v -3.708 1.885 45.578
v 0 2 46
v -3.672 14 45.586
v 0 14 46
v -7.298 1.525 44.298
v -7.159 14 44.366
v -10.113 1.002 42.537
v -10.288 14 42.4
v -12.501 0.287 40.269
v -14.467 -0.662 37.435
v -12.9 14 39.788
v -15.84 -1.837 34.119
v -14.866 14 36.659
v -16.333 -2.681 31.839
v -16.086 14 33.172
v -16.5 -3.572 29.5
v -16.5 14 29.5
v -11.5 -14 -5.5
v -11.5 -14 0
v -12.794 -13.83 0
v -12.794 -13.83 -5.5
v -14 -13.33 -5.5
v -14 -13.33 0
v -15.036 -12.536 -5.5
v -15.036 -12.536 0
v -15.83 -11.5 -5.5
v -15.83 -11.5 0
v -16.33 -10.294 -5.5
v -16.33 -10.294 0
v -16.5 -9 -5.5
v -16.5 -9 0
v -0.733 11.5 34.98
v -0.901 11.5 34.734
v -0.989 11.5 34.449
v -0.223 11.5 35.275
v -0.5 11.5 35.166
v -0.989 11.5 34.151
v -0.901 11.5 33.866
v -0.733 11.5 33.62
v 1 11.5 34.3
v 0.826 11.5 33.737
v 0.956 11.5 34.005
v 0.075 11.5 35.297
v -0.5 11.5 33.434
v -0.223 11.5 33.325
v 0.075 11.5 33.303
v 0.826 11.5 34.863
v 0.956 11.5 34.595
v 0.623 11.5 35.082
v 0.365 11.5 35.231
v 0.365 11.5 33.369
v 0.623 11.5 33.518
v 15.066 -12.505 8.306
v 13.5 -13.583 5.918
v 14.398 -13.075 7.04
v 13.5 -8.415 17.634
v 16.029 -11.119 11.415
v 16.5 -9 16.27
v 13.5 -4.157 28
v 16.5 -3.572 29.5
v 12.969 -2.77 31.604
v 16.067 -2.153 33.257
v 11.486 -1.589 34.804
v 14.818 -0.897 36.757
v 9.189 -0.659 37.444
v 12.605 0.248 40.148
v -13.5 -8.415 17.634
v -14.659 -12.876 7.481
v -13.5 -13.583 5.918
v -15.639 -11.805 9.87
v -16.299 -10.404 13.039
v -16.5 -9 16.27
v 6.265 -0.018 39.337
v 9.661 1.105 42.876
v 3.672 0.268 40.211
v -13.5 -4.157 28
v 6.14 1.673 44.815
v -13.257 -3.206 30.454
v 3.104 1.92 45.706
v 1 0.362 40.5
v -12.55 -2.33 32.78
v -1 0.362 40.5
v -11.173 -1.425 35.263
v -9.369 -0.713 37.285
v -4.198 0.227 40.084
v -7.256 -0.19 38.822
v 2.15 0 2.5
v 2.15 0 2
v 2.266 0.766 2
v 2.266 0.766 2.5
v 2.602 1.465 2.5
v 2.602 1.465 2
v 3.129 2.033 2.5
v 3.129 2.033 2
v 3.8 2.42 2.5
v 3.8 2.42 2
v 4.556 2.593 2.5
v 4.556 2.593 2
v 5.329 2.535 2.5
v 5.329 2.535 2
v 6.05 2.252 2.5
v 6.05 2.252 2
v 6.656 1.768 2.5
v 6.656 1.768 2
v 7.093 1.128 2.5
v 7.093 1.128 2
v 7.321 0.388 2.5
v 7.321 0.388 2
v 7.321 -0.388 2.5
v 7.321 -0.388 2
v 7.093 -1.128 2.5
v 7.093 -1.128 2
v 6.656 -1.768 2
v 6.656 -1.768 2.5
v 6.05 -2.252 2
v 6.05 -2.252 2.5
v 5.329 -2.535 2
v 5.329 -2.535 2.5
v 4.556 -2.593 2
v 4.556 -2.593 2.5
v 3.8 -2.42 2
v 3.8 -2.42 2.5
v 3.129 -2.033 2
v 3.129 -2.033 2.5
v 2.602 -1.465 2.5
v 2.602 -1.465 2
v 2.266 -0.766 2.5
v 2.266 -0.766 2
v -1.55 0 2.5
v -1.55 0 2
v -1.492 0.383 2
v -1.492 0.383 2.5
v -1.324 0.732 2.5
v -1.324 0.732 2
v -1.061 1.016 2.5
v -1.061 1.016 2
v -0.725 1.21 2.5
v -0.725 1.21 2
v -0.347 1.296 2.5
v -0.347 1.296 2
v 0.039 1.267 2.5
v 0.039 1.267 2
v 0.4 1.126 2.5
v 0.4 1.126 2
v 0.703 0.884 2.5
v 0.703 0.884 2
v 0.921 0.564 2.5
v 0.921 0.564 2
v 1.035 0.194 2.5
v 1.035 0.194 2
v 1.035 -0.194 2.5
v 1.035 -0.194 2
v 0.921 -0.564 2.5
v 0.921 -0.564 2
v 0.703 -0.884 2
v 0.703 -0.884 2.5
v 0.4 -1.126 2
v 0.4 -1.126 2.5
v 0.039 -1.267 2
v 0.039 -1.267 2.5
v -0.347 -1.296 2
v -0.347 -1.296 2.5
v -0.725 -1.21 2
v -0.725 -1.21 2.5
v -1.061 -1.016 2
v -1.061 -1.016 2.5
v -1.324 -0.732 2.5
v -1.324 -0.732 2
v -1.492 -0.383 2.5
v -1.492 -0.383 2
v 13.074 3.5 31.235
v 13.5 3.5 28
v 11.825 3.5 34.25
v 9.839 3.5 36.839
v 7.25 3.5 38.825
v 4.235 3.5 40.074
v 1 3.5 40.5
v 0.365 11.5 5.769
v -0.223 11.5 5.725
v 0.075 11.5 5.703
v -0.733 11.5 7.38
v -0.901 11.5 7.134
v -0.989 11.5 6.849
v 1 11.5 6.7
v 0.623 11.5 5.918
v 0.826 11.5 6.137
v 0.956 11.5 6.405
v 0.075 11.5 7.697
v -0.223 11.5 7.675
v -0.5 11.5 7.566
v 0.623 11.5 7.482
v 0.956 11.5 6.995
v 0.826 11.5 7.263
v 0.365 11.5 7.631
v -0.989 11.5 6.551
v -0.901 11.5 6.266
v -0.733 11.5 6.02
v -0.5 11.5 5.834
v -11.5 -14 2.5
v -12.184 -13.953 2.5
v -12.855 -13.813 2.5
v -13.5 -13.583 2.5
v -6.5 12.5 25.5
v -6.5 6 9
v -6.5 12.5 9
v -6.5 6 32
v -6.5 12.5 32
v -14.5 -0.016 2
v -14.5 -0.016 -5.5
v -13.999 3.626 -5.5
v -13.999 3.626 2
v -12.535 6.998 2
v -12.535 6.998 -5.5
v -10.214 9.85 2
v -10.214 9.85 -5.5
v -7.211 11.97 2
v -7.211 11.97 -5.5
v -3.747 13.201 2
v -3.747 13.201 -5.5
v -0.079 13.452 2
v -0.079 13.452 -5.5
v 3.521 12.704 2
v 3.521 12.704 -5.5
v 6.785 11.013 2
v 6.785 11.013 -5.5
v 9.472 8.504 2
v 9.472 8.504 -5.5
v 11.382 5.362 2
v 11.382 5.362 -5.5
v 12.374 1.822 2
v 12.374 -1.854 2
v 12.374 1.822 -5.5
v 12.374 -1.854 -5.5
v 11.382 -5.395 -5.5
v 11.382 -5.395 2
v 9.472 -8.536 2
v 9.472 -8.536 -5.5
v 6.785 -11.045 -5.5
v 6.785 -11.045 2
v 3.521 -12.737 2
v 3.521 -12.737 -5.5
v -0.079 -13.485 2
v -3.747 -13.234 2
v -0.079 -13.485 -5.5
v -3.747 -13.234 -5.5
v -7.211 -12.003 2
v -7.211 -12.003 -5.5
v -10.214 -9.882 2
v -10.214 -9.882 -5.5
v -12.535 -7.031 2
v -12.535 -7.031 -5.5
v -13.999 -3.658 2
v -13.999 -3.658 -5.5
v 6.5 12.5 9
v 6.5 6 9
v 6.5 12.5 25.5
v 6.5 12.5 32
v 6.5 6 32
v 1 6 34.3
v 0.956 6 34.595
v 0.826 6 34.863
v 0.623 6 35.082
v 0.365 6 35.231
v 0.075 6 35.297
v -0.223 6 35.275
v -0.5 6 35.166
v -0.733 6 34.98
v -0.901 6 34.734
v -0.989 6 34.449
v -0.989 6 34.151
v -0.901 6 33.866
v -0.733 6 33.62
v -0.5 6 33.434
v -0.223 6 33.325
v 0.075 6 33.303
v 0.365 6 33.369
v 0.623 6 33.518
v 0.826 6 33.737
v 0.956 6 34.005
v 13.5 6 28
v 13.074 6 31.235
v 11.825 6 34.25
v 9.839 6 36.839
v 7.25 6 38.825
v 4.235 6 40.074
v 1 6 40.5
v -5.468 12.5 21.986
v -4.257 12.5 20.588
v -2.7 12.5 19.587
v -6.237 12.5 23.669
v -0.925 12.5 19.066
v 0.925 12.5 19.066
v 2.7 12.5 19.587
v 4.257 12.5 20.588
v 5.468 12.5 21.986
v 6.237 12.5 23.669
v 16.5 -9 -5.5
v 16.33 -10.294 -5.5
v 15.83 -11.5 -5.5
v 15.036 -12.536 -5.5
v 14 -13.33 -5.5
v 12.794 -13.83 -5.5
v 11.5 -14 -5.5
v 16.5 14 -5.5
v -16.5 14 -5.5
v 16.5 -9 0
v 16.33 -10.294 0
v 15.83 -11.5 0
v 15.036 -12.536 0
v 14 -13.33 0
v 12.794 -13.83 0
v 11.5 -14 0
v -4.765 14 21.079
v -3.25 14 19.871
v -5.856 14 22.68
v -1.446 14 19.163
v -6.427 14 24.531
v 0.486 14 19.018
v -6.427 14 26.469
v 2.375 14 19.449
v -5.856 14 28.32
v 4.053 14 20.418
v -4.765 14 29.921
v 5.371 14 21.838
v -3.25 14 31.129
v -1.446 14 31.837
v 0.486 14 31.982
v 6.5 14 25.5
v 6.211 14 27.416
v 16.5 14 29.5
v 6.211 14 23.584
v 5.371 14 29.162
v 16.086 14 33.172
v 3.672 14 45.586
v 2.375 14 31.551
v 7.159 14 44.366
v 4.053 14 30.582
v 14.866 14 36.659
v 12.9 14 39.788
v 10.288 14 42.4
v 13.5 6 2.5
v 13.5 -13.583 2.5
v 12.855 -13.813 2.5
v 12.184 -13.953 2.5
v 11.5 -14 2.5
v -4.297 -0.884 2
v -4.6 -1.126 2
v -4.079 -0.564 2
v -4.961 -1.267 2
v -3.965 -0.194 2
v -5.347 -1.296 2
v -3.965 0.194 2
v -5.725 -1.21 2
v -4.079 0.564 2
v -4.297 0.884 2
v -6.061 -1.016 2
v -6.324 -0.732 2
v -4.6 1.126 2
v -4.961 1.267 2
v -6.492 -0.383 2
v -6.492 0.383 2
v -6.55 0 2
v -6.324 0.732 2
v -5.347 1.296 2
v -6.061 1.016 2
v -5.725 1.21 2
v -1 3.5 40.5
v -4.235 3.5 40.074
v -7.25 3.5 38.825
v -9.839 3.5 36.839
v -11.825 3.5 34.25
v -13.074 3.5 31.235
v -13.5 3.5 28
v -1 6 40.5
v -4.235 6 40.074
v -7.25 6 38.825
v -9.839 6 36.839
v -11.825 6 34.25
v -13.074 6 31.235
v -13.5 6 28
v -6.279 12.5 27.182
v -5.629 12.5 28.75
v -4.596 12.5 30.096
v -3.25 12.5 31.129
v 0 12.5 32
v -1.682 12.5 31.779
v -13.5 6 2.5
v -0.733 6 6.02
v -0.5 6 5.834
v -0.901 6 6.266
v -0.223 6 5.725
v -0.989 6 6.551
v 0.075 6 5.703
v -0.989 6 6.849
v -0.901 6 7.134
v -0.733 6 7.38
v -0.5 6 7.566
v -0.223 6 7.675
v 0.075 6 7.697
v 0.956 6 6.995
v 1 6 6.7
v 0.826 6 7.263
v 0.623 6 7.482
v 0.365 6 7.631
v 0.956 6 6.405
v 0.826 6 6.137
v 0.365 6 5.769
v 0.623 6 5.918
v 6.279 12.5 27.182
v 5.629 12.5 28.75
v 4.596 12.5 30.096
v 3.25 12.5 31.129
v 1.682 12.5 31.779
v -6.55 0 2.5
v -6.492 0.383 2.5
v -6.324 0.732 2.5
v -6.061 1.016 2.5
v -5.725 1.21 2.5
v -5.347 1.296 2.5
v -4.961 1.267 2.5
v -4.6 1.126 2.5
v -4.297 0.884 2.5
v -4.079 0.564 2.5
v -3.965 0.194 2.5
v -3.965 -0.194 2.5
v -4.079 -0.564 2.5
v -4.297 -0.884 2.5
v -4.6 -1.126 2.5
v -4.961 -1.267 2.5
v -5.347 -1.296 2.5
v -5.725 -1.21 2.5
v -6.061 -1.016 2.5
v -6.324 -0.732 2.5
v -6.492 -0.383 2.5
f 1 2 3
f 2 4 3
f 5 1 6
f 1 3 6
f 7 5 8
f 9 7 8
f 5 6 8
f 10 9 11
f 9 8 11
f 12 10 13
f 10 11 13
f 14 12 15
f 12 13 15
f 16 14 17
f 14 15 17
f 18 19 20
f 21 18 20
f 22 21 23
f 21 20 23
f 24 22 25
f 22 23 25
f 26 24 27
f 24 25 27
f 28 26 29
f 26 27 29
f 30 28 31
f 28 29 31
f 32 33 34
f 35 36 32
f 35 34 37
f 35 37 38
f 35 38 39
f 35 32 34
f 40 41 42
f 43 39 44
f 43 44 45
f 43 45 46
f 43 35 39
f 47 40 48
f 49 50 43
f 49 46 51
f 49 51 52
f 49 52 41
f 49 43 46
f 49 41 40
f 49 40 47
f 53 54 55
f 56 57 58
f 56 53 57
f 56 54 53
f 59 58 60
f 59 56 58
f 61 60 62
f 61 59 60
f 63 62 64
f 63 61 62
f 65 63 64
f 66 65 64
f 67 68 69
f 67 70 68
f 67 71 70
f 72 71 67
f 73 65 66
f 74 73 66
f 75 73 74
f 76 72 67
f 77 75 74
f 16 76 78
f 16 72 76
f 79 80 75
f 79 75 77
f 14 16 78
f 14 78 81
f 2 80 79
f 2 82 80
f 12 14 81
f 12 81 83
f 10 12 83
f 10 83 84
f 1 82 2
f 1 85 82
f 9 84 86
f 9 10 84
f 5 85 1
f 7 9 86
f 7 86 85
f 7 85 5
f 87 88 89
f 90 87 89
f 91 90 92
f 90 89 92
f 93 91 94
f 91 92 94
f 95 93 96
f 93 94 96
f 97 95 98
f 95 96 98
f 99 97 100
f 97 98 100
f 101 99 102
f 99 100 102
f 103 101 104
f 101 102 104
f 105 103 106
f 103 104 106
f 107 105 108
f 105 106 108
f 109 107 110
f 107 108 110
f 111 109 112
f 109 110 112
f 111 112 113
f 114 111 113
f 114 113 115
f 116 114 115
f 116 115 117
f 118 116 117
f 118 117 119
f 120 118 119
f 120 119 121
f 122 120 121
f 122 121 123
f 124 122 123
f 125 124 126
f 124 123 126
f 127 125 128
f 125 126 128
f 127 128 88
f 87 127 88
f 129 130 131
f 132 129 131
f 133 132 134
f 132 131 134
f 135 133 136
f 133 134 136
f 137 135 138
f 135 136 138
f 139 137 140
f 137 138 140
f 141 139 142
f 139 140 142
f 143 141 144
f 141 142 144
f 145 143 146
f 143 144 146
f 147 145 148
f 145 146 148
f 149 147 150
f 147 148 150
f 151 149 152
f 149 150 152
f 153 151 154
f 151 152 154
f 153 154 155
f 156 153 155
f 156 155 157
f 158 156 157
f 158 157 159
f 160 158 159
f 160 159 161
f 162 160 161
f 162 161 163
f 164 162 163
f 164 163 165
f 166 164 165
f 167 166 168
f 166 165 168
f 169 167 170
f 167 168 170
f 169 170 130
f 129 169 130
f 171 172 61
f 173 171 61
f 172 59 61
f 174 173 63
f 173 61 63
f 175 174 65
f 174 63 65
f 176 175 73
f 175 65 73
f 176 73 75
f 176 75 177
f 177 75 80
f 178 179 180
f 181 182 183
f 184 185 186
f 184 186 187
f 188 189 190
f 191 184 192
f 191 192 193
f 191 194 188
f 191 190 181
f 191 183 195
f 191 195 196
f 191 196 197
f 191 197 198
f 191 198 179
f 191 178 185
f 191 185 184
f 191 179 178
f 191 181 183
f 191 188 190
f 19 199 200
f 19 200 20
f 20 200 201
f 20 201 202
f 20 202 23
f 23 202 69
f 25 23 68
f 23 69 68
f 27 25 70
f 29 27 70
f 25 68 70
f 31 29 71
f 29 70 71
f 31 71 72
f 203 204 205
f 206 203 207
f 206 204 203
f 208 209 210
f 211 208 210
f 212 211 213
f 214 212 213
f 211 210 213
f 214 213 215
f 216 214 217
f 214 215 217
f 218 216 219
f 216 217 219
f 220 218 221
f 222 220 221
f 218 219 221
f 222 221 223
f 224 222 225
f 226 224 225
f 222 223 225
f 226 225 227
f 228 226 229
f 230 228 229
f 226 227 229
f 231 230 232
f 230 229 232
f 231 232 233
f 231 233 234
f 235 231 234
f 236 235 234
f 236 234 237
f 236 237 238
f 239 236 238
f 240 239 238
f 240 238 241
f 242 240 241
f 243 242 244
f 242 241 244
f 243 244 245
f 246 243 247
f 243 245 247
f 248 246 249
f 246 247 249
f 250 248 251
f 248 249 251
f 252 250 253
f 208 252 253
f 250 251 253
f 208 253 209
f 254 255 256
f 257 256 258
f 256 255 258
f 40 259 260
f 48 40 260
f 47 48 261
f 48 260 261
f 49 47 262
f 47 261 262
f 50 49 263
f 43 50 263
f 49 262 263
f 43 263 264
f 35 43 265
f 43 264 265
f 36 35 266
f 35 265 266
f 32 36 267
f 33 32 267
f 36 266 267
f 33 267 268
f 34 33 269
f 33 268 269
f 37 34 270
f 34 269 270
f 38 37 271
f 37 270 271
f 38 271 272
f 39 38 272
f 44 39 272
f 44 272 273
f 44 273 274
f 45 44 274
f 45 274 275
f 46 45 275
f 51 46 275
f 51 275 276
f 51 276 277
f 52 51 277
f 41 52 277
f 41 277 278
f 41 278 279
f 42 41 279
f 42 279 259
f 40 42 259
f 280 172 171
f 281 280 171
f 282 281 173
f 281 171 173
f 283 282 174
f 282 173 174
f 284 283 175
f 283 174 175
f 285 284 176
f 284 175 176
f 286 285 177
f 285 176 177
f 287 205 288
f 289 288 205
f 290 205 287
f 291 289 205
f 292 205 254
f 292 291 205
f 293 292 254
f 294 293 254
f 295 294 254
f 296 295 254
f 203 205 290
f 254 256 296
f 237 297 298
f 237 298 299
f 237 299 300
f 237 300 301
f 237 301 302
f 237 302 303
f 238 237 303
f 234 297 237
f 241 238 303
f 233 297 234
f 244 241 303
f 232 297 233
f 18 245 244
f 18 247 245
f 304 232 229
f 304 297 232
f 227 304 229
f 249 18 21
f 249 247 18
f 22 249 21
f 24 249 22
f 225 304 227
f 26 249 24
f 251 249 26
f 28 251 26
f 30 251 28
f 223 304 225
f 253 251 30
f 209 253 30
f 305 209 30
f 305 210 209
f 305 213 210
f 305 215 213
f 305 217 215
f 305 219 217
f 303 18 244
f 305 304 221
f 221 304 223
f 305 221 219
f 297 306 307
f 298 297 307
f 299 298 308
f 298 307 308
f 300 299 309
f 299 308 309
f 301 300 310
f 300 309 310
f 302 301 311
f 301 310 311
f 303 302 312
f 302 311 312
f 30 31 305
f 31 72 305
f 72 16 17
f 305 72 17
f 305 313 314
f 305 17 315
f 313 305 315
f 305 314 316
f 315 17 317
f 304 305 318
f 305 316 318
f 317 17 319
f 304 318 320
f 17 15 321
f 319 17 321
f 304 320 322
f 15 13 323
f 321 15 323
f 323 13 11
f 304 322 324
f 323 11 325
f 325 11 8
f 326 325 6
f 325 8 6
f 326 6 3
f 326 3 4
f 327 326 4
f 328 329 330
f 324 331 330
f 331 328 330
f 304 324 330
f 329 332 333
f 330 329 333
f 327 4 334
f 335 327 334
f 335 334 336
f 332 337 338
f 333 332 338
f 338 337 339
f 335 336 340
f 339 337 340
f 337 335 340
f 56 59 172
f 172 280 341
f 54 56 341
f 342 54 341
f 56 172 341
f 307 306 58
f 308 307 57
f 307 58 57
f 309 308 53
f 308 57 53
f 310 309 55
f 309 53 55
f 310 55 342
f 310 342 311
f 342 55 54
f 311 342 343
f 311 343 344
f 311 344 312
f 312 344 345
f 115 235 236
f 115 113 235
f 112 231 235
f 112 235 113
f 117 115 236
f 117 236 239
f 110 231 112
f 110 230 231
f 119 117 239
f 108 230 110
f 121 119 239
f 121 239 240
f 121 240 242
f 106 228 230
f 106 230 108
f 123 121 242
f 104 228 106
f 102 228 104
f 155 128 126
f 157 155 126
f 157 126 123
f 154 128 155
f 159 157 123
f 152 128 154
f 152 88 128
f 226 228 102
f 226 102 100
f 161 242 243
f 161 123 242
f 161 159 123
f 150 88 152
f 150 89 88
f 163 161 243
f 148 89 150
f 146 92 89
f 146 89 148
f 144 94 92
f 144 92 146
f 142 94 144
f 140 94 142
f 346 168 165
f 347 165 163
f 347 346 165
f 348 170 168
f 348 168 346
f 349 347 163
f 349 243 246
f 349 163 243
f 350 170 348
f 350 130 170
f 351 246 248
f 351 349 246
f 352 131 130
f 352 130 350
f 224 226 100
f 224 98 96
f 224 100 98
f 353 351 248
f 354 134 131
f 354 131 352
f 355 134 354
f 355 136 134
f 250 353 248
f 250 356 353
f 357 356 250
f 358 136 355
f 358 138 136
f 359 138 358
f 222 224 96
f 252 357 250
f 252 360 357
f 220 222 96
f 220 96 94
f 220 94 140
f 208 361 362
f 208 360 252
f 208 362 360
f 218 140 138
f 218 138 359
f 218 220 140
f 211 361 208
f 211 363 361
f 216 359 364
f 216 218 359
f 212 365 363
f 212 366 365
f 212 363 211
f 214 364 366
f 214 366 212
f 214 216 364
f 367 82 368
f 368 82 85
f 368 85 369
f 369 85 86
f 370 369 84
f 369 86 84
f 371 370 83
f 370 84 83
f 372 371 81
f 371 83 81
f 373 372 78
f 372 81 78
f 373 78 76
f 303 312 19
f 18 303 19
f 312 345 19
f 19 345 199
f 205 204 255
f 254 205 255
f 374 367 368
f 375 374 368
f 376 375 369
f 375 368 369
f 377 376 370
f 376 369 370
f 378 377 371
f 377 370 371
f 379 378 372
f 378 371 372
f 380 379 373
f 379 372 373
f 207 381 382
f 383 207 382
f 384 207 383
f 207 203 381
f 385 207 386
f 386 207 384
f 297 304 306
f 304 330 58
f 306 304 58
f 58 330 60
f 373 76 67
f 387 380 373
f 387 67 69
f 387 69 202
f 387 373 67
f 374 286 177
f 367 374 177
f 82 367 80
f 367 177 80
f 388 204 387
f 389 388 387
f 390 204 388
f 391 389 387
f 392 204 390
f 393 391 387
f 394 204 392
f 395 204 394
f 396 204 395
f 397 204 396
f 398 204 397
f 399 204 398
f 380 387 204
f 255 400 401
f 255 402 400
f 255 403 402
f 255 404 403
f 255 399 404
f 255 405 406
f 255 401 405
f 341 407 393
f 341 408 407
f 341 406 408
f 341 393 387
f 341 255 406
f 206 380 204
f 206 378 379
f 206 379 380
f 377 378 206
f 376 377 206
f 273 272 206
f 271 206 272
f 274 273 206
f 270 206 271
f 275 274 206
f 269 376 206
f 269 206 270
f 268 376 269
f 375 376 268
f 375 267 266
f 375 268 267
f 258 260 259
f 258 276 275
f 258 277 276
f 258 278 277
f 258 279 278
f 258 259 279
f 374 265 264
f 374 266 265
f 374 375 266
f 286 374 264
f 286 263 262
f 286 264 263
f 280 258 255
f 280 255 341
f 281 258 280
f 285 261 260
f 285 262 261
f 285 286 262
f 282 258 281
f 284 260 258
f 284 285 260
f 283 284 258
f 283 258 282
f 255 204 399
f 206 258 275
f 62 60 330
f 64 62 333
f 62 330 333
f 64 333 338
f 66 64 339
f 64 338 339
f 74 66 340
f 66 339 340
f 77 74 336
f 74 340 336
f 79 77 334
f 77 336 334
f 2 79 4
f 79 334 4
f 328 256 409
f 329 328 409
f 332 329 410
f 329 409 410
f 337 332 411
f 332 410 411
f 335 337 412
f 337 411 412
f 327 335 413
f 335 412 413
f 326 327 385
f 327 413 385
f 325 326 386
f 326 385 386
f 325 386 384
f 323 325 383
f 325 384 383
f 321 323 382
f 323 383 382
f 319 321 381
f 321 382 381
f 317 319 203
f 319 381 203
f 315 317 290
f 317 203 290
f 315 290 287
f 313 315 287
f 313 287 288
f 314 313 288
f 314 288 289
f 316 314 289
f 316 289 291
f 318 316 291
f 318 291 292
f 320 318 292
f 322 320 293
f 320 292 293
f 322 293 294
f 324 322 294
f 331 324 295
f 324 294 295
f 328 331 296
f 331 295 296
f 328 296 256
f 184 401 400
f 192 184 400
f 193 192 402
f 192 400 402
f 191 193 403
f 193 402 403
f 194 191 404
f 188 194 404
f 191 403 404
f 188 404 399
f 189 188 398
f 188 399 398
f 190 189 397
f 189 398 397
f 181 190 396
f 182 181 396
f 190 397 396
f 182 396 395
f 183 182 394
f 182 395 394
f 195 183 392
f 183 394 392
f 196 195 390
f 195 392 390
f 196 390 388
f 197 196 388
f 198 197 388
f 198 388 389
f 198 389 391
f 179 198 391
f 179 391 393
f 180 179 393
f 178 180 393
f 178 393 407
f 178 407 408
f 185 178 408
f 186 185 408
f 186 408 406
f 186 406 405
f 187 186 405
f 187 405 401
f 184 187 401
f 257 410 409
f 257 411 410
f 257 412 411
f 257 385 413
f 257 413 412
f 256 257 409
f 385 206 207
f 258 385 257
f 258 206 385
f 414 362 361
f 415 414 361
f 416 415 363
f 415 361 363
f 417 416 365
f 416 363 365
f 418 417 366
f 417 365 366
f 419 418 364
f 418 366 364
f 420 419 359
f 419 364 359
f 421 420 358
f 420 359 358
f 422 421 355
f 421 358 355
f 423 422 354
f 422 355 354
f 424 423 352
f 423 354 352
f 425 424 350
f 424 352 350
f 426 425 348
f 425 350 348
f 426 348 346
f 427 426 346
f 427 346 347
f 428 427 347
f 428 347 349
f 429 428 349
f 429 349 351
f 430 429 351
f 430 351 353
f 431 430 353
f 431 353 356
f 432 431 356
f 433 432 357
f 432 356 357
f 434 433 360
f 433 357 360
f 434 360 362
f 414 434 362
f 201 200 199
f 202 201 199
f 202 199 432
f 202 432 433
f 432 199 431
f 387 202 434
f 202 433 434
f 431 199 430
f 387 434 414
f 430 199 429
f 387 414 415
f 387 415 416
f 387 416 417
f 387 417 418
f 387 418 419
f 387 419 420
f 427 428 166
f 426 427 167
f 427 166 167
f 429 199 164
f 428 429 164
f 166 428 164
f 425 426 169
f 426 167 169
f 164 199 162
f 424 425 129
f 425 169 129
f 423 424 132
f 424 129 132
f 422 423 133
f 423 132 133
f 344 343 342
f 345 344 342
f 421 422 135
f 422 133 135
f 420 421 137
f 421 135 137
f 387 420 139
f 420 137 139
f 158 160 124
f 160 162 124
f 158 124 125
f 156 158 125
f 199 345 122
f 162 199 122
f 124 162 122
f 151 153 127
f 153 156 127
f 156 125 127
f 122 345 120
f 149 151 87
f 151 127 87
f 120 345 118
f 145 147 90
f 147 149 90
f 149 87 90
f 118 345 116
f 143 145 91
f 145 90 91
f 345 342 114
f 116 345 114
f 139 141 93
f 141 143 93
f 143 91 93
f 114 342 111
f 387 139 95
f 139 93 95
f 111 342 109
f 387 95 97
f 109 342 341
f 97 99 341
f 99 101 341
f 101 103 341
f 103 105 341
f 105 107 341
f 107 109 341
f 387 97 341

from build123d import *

# Parameters (mm, degrees)
SKETCH1_W               = 33
SKETCH1_H               = 28
BOSS_EXTRUDE1_DEPTH     = 46
CUT_EXTRUDE1_DEPTH      = 59.318093247
CUT_EXTRUDE1_DEPTH_BACK = 59.318093247
CUT_EXTRUDE2_START      = -3
CUT_EXTRUDE2_DEPTH      = 27
FILLET1_R               = 12.5
FILLET2_R               = 16.5
FILLET3_R               = 5
SKETCH4_W               = 13
SKETCH4_H               = 23
CUT_EXTRUDE3_DEPTH      = 9
SKETCH5_R               = 6.5
CUT_EXTRUDE4_DEPTH      = 56.592265809
SKETCH6_R               = 1
CUT_EXTRUDE5_DEPTH      = 8
BOSS_EXTRUDE2_DEPTH     = 5.5
SKETCH11_R              = 13.5
CUT_EXTRUDE8_DEPTH      = 7.5
SKETCH7_R               = 1.3
SKETCH7_R_2             = 2.6
CUT_EXTRUDE6_DEPTH      = 0.5
SKETCH12_R              = 1
CUT_EXTRUDE9_DEPTH      = 2.5


with BuildPart() as part:
    # Sketch1 → Boss-Extrude1 (new body)
    with BuildSketch(Plane.XY):
        Rectangle(SKETCH1_W, SKETCH1_H)
    extrude(amount=BOSS_EXTRUDE1_DEPTH)

    # Sketch2 → Cut-Extrude1 (cut, two sides: drawn at the far end of the back side and taken through both)
    with BuildSketch(Plane(origin=(16.5, 0, 0), x_dir=(0, 0, -1), z_dir=(1, 0, 0)).offset(-CUT_EXTRUDE1_DEPTH_BACK)):
        with BuildLine():
            Line((-46, -14), (-5, -14))
            add(Edge.make_bspline(
                [(-5, -14), (-31.642917286, -1.866068932), (-46, 2)],
                knots=[0, 0, 0, 1, 1, 1], degree=2))
            Line((-46, 2), (-46, -14))
        make_face()
    extrude(amount=CUT_EXTRUDE1_DEPTH + CUT_EXTRUDE1_DEPTH_BACK, mode=Mode.SUBTRACT)

    # Sketch3 → Cut-Extrude2 (cut)
    with BuildSketch(Plane(origin=(16.5, 0, 0), x_dir=(0, 0, -1), z_dir=(1, 0, 0)).offset(CUT_EXTRUDE2_START)):
        with BuildLine():
            Line((-5, -14), (-2.5, -14))
            Line((-2.5, -14), (-2.5, 3.5))
            Line((-2.5, 3.5), (-40.5, 3.5))
            Line((-40.5, 3.5), (-40.5, 0.361845))
            add(Edge.make_bspline(
                [(-5, -14), (-26.900788686, -4.025767171), (-40.5, 0.361845)],
                knots=[0, 0, 0, 1, 1, 1], degree=2))
        make_face()
    extrude(amount=-CUT_EXTRUDE2_DEPTH, mode=Mode.SUBTRACT)

    # Fillet1
    fillet1_edges = [part.edges().sort_by_distance(p)[0] for p in [
        (13.5, 1.9309225, 40.5),
        (-13.5, 1.9309225, 40.5),
    ]]
    fillet(fillet1_edges, radius=FILLET1_R)

    # Fillet2
    fillet2_edges = [part.edges().sort_by_distance(p)[0] for p in [
        (16.5, 8, 46),
        (-16.5, 8, 46),
    ]]
    fillet(fillet2_edges, radius=FILLET2_R - 0.0001)  # a hair under: the kernel refuses the full size

    # Fillet3
    fillet3_edges = [part.edges().sort_by_distance(p)[0] for p in [
        (16.5, -14, 2.5),
        (-16.5, -14, 2.5),
    ]]
    fillet(fillet3_edges, radius=FILLET3_R)

    # Sketch4 → Cut-Extrude3 (cut)
    with BuildSketch(Plane.XZ.offset(-3.5)):
        with Locations((0, 20.5)):
            Rectangle(SKETCH4_W, SKETCH4_H)
    extrude(amount=-CUT_EXTRUDE3_DEPTH, mode=Mode.SUBTRACT)

    # Sketch5 → Cut-Extrude4 (cut, through all)
    with BuildSketch(Plane.XZ.offset(-12.5)):
        with Locations((0, 25.5)):
            Circle(SKETCH5_R)
    extrude(amount=-CUT_EXTRUDE4_DEPTH, mode=Mode.SUBTRACT)

    # Sketch6 → Cut-Extrude5 (cut)
    with BuildSketch(Plane.XZ.offset(-3.5)):
        with Locations((0, 34.3)):
            Circle(SKETCH6_R)
        with Locations((0, 6.7)):
            Circle(SKETCH6_R)
    extrude(amount=-CUT_EXTRUDE5_DEPTH, mode=Mode.SUBTRACT)

    # Sketch10 → Boss-Extrude2 (add)
    with BuildSketch(Plane(origin=(0, 0, 0), x_dir=(-1, 0, 0), z_dir=(0, 0, -1))):
        with BuildLine():
            Line((-16.5, 14), (-16.5, -9))
            ThreePointArc((-16.5, -9), (-15.035533906, -12.535533906), (-11.5, -14))
            Line((-11.5, -14), (11.5, -14))
            ThreePointArc((11.5, -14), (15.035533906, -12.535533906), (16.5, -9))
            Line((16.5, -9), (16.5, 14))
            Line((16.5, 14), (-16.5, 14))
        make_face()
    extrude(amount=BOSS_EXTRUDE2_DEPTH)

    # Sketch11 → Cut-Extrude8 (cut)
    with BuildSketch(Plane(origin=(0, 0, -5.5), x_dir=(-1, 0, 0), z_dir=(0, 0, -1))):
        with Locations((1, -0.016150077)):
            Circle(SKETCH11_R)
    extrude(amount=-CUT_EXTRUDE8_DEPTH, mode=Mode.SUBTRACT)

    # Sketch7 → Cut-Extrude6 (cut)
    with BuildSketch(Plane(origin=(0, 0, 2), x_dir=(-1, 0, 0), z_dir=(0, 0, -1))):
        with Locations((5.25, 0)):
            Circle(SKETCH7_R)
        with Locations((-4.75, 0)):
            Circle(SKETCH7_R_2)
        with Locations((0.25, 0)):
            Circle(SKETCH7_R)
    extrude(amount=-CUT_EXTRUDE6_DEPTH, mode=Mode.SUBTRACT)

    # Sketch12 → Cut-Extrude9 (cut)
    with BuildSketch(Plane.XZ.offset(-3.5)):
        with BuildLine():
            Line((-13.5, 2.5), (13.5, 2.5))
            Line((13.5, 2.5), (13.5, 28))
            ThreePointArc((13.5, 28), (9.838834765, 36.838834765), (1, 40.5))
            Line((1, 40.5), (-1, 40.5))
            ThreePointArc((-1, 40.5), (-9.838834765, 36.838834765), (-13.5, 28))
            Line((-13.5, 28), (-13.5, 2.5))
        make_face()
        with Locations((0, 6.7)):
            Circle(SKETCH12_R, mode=Mode.SUBTRACT)
        Polygon((6.5, 9), (-6.5, 9), (-6.5, 32), (0, 32), (6.5, 32), align=None, mode=Mode.SUBTRACT)
        with Locations((0, 34.3)):
            Circle(SKETCH12_R, mode=Mode.SUBTRACT)
    extrude(amount=-CUT_EXTRUDE9_DEPTH, mode=Mode.SUBTRACT)


solid = part.part
